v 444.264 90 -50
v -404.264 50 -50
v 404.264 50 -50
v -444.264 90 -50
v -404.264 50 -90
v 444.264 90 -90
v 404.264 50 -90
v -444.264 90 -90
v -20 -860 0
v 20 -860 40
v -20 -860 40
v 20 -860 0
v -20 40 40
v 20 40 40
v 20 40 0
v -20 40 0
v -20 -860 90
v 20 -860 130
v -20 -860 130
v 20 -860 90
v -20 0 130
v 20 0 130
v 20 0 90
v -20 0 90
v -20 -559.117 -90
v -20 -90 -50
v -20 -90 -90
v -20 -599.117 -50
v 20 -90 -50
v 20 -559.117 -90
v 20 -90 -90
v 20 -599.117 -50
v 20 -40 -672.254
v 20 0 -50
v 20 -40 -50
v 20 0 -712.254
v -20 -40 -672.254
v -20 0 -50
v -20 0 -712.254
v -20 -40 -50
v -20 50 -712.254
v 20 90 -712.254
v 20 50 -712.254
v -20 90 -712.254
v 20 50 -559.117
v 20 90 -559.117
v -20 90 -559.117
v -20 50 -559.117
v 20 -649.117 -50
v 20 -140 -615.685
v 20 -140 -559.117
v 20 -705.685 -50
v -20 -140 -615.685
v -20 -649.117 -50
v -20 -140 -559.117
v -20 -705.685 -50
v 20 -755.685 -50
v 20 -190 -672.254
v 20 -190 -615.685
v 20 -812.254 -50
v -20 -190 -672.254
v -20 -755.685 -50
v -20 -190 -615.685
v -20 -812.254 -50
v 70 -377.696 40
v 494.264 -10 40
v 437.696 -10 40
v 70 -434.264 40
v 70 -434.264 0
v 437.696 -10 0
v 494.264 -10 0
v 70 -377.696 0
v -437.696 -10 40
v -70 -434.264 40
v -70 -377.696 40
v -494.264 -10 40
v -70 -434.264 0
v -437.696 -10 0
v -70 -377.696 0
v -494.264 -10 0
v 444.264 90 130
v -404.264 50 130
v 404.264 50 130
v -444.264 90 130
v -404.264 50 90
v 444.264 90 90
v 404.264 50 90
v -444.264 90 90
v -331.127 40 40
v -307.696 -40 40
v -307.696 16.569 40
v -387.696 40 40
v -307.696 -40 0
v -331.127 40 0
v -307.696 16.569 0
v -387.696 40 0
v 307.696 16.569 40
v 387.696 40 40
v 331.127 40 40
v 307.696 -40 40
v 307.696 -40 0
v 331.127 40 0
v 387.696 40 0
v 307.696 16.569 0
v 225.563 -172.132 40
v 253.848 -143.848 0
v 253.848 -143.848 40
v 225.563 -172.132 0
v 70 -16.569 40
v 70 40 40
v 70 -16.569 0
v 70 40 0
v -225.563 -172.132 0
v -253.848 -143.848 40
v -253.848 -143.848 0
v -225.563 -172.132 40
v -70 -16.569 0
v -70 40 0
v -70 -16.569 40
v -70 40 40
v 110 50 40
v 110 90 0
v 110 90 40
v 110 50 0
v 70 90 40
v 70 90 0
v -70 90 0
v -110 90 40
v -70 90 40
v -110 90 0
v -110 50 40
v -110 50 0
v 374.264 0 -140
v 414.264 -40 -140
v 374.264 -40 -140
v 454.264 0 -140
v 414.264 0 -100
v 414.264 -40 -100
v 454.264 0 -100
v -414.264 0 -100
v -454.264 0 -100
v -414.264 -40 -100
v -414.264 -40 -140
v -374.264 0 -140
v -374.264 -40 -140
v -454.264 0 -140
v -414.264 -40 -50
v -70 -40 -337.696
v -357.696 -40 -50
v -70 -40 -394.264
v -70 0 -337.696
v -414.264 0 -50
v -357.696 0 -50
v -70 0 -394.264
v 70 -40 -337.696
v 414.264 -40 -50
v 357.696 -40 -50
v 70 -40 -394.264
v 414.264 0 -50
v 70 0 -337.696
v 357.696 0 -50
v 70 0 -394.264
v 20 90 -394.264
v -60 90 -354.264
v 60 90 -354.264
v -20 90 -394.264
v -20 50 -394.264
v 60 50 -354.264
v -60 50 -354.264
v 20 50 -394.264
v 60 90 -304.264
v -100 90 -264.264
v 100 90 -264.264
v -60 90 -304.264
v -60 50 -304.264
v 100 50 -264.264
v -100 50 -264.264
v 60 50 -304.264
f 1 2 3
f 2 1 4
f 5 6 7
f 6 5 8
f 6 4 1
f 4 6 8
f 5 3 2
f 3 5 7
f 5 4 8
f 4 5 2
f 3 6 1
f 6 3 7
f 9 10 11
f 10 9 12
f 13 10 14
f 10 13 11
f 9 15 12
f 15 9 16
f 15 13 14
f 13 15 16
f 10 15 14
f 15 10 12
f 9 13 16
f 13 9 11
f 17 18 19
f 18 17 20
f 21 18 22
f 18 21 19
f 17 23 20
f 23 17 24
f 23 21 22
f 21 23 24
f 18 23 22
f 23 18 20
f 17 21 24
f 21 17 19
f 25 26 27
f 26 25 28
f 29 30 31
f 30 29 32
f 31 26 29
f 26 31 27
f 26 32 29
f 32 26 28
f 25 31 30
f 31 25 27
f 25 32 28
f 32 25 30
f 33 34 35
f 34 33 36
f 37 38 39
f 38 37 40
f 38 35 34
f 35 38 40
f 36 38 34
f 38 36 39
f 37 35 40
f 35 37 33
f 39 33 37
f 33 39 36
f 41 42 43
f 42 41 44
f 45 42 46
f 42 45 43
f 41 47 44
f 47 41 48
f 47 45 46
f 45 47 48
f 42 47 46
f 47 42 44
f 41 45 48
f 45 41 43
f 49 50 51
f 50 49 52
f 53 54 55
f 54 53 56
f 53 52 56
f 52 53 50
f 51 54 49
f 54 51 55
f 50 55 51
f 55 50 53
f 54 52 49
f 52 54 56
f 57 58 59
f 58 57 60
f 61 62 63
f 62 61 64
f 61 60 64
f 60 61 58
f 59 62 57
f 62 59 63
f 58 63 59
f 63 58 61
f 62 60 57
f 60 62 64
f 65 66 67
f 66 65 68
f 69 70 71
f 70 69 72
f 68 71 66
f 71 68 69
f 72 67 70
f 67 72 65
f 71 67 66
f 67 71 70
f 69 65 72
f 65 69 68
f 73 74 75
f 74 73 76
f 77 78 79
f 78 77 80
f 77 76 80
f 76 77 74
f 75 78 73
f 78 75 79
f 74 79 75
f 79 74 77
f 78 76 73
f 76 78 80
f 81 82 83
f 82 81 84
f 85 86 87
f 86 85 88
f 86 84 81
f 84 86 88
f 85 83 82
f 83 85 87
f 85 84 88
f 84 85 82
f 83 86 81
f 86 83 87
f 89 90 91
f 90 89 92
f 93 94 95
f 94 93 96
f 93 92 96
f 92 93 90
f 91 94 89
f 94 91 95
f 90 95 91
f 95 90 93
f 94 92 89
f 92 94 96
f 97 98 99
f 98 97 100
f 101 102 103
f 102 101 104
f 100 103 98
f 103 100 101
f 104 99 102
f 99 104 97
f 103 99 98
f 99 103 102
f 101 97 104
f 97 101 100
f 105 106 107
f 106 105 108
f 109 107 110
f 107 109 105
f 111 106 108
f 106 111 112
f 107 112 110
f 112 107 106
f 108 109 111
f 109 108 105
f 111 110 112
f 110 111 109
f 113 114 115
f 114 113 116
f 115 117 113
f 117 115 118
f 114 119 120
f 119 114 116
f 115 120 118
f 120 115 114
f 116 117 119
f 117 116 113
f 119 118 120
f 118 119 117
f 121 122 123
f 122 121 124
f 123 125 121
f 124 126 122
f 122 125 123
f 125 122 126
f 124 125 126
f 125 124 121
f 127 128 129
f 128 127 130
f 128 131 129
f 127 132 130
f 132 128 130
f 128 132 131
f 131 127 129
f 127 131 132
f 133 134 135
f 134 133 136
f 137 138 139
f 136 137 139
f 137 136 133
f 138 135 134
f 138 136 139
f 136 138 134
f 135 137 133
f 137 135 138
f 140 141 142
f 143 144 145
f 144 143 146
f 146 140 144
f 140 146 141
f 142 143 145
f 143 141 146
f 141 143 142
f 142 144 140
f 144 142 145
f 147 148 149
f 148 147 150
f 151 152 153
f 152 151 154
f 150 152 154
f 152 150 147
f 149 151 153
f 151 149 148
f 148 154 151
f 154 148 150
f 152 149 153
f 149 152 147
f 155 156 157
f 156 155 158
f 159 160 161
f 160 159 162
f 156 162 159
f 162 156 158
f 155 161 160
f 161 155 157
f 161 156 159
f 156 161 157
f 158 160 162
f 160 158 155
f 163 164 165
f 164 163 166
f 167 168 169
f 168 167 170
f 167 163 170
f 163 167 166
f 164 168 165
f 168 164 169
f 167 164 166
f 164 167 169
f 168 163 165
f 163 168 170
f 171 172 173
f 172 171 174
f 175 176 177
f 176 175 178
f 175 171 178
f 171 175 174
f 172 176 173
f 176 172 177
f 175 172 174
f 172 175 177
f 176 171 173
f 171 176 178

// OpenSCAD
// Part List:
//
//     A   2x  113x40x40 slat (45/45)
//     B   1x  153x40x40 slat ( 0/ 0)
//     C   2x  260x40x40 slat (45/ 0)
//     D   2x  487x40x40 slat (45/45)
//     E   1x  509x40x40 slat ( 0/45)
//     F   2x  600x40x40 slat (45/45)
//     G   1x  662x40x40 slat ( 0/45)
//     H   1x  800x40x40 slat (45/45)
//     K   1x  860x40x40 slat ( 0/ 0)
//     L   1x  880x40x40 slat (45/45)
//     M   2x  889x40x40 slat (45/45)
//     N   1x  900x40x40 slat ( 0/ 0)
//
//     P   2x   40x40x40 slat (45/ 0)
//     Q   1x   40x40x40 slat (-45/-45)
//     R   1x  120x40x40 slat (-45/-45)
//     S   1x   80x40x40 slat (45/45/90)
//     T   1x   80x40x40 slat (45/45/-90)
//
//  Total 23 slats with a combined length of 9862 mm.

explode = 50;

module slat(length=500, angle1=0, angle2=0, angle3=0, depth=40, height=40)
{
	ext1 = angle1 < 0 ? depth/cos(-angle1) : 0;
	ext2 = angle2 < 0 ? depth/cos(-angle2) : 0;
	echo(str(round(length), "x", height, "x", depth, " slat (", angle1, "/", angle2, "/", angle3, ")"));
	render() difference() {
		translate([-ext1, -depth, 0])
			cube([length+ext1+ext2, depth, height]);

		rotate([0, 0, angle1])
			translate([-depth, -depth*(0.5 + 1/cos(angle1)), -0.5*height])
			cube([depth, depth*(1 + 1/cos(angle1)), 2*height]);

		translate([length, 0, 0])
			translate([0, -depth/2, height/2])
			rotate([angle3, 0, 0])
			translate([0, depth/2, -height/2])
			rotate([0, 0, -angle2])
			translate([0, -depth*(0.5 + 1/cos(angle1)), -0.5*height])
			cube([depth, depth*(1 + 1/cos(angle1)), 2*height]);
	}
}

color([0.2,0.2,0.8])
	translate([-20-600*sin(45), 40+explode, -40-explode])
	slat(40+1200*sin(45), 45, 45);

color([0.2,0.8,0.2])
	translate([20, 40, 0])
	rotate([0, 0, -90])
	slat(900);

color([0.6,0.2,0.6])
	translate([20, 0, 40+explode])
	rotate([0, 0, -90])
	slat(900-40);

color([0.6,0.2,0.6])
	translate([20, -40-explode, -explode])
	rotate([90, 0, -90])
	slat(800*sin(45)-40/sin(45), 0, 45);

color([0.8,0.2,0.2])
	translate([-20, 0, -explode])
	rotate([0, 90, 0])
	slat(800*sin(45)+40/sin(45)+40, 0, 45);

color([0.2,0.2,0.8])
	translate([-20, 40+explode, 40/sin(45)-800*sin(45)-explode])
	rotate([0, 90, 0])
	slat(40 + 80/sin(45));

color([0.2,0.2,0.8])
	translate([-20, -40-2*explode, -800*sin(45)-explode])
	rotate([90, -135, 90])
	slat(800, 45, 45);

color([0.6,0.2,0.6])
	translate([-20, -40-3*explode, -40/sin(45)-800*sin(45)-explode])
	rotate([90, -135, 90])
	slat(800+80, 45, 45);

color([0.8,0.2,0.2])
	translate([20+600*sin(45)+explode, 40-explode, 0])
	rotate([0, 0, -135])
	slat(600, 45, 45);

color([0.8,0.2,0.2])
	translate([-20-explode, 40-600*sin(45)-explode, 0])
	rotate([0, 0, 135])
	slat(600, 45, 45);

color([0.2,0.2,0.8])
	translate([-20-600*sin(45), 40+explode, 40+explode])
	slat(40+1200*sin(45), 45, 45);

color([0.6,0.2,0.6])
	translate([60+40/sin(45)-600*sin(45), -40, 0])
	rotate([0, 0, 135])
	slat(80/sin(45), 45, 45);

color([0.6,0.2,0.6])
	translate([20-40/sin(45)+600*sin(45), 40, 0])
	rotate([0, 0, -135])
	slat(80/sin(45), 45, 45);

color([0.6,0.2,0.6])
	translate([20+explode, 40, 0])
	rotate([0, 0, -45])
	slat(300-40, 45, 0);

color([0.6,0.2,0.6])
	translate([-20-explode, 40,40])
	rotate([180, 0, -135])
	slat(300-40, 45, 0);

color([0.8,0.2,0.2])
	translate([20+explode, 40+explode, 0])
	slat(40, 45, 0);

color([0.8,0.2,0.2])
	translate([-60-explode, explode, 0])
	rotate([0, 0, 90])
	slat(40, 45, 0);

color([0.6,0.2,0.6])
	translate([-20+600*sin(45)+explode, 0, -2*explode])
	rotate([180, 0, 180])
	slat(80, 45, 45, 90);

color([0.6,0.2,0.6])
	translate([20-600*sin(45)-explode, 0, -40-2*explode])
	slat(80, 45, 45, -90);

k = 600 - 80/sin(45);

color([0.2,0.8,0.2])
	translate([-20-explode, 0, -k*sin(45)-explode])
	rotate([90, -135, 0])
	slat(k, 45, 45);

color([0.2,0.8,0.2])
	translate([20+k*sin(45)+explode, 0, -explode])
	rotate([90, 135, 0])
	slat(k, 45, 45);

color([0.2,0.2,0.8])
	translate([-20, explode, -k*sin(45)-explode])
	rotate([-90, 0, 0])
	slat(40, -45, -45);

color([0.6,0.2,0.6])
	translate([-60, explode, 40-k*sin(45)])
	rotate([-90, 0, 0])
	slat(120, -45, -45);
